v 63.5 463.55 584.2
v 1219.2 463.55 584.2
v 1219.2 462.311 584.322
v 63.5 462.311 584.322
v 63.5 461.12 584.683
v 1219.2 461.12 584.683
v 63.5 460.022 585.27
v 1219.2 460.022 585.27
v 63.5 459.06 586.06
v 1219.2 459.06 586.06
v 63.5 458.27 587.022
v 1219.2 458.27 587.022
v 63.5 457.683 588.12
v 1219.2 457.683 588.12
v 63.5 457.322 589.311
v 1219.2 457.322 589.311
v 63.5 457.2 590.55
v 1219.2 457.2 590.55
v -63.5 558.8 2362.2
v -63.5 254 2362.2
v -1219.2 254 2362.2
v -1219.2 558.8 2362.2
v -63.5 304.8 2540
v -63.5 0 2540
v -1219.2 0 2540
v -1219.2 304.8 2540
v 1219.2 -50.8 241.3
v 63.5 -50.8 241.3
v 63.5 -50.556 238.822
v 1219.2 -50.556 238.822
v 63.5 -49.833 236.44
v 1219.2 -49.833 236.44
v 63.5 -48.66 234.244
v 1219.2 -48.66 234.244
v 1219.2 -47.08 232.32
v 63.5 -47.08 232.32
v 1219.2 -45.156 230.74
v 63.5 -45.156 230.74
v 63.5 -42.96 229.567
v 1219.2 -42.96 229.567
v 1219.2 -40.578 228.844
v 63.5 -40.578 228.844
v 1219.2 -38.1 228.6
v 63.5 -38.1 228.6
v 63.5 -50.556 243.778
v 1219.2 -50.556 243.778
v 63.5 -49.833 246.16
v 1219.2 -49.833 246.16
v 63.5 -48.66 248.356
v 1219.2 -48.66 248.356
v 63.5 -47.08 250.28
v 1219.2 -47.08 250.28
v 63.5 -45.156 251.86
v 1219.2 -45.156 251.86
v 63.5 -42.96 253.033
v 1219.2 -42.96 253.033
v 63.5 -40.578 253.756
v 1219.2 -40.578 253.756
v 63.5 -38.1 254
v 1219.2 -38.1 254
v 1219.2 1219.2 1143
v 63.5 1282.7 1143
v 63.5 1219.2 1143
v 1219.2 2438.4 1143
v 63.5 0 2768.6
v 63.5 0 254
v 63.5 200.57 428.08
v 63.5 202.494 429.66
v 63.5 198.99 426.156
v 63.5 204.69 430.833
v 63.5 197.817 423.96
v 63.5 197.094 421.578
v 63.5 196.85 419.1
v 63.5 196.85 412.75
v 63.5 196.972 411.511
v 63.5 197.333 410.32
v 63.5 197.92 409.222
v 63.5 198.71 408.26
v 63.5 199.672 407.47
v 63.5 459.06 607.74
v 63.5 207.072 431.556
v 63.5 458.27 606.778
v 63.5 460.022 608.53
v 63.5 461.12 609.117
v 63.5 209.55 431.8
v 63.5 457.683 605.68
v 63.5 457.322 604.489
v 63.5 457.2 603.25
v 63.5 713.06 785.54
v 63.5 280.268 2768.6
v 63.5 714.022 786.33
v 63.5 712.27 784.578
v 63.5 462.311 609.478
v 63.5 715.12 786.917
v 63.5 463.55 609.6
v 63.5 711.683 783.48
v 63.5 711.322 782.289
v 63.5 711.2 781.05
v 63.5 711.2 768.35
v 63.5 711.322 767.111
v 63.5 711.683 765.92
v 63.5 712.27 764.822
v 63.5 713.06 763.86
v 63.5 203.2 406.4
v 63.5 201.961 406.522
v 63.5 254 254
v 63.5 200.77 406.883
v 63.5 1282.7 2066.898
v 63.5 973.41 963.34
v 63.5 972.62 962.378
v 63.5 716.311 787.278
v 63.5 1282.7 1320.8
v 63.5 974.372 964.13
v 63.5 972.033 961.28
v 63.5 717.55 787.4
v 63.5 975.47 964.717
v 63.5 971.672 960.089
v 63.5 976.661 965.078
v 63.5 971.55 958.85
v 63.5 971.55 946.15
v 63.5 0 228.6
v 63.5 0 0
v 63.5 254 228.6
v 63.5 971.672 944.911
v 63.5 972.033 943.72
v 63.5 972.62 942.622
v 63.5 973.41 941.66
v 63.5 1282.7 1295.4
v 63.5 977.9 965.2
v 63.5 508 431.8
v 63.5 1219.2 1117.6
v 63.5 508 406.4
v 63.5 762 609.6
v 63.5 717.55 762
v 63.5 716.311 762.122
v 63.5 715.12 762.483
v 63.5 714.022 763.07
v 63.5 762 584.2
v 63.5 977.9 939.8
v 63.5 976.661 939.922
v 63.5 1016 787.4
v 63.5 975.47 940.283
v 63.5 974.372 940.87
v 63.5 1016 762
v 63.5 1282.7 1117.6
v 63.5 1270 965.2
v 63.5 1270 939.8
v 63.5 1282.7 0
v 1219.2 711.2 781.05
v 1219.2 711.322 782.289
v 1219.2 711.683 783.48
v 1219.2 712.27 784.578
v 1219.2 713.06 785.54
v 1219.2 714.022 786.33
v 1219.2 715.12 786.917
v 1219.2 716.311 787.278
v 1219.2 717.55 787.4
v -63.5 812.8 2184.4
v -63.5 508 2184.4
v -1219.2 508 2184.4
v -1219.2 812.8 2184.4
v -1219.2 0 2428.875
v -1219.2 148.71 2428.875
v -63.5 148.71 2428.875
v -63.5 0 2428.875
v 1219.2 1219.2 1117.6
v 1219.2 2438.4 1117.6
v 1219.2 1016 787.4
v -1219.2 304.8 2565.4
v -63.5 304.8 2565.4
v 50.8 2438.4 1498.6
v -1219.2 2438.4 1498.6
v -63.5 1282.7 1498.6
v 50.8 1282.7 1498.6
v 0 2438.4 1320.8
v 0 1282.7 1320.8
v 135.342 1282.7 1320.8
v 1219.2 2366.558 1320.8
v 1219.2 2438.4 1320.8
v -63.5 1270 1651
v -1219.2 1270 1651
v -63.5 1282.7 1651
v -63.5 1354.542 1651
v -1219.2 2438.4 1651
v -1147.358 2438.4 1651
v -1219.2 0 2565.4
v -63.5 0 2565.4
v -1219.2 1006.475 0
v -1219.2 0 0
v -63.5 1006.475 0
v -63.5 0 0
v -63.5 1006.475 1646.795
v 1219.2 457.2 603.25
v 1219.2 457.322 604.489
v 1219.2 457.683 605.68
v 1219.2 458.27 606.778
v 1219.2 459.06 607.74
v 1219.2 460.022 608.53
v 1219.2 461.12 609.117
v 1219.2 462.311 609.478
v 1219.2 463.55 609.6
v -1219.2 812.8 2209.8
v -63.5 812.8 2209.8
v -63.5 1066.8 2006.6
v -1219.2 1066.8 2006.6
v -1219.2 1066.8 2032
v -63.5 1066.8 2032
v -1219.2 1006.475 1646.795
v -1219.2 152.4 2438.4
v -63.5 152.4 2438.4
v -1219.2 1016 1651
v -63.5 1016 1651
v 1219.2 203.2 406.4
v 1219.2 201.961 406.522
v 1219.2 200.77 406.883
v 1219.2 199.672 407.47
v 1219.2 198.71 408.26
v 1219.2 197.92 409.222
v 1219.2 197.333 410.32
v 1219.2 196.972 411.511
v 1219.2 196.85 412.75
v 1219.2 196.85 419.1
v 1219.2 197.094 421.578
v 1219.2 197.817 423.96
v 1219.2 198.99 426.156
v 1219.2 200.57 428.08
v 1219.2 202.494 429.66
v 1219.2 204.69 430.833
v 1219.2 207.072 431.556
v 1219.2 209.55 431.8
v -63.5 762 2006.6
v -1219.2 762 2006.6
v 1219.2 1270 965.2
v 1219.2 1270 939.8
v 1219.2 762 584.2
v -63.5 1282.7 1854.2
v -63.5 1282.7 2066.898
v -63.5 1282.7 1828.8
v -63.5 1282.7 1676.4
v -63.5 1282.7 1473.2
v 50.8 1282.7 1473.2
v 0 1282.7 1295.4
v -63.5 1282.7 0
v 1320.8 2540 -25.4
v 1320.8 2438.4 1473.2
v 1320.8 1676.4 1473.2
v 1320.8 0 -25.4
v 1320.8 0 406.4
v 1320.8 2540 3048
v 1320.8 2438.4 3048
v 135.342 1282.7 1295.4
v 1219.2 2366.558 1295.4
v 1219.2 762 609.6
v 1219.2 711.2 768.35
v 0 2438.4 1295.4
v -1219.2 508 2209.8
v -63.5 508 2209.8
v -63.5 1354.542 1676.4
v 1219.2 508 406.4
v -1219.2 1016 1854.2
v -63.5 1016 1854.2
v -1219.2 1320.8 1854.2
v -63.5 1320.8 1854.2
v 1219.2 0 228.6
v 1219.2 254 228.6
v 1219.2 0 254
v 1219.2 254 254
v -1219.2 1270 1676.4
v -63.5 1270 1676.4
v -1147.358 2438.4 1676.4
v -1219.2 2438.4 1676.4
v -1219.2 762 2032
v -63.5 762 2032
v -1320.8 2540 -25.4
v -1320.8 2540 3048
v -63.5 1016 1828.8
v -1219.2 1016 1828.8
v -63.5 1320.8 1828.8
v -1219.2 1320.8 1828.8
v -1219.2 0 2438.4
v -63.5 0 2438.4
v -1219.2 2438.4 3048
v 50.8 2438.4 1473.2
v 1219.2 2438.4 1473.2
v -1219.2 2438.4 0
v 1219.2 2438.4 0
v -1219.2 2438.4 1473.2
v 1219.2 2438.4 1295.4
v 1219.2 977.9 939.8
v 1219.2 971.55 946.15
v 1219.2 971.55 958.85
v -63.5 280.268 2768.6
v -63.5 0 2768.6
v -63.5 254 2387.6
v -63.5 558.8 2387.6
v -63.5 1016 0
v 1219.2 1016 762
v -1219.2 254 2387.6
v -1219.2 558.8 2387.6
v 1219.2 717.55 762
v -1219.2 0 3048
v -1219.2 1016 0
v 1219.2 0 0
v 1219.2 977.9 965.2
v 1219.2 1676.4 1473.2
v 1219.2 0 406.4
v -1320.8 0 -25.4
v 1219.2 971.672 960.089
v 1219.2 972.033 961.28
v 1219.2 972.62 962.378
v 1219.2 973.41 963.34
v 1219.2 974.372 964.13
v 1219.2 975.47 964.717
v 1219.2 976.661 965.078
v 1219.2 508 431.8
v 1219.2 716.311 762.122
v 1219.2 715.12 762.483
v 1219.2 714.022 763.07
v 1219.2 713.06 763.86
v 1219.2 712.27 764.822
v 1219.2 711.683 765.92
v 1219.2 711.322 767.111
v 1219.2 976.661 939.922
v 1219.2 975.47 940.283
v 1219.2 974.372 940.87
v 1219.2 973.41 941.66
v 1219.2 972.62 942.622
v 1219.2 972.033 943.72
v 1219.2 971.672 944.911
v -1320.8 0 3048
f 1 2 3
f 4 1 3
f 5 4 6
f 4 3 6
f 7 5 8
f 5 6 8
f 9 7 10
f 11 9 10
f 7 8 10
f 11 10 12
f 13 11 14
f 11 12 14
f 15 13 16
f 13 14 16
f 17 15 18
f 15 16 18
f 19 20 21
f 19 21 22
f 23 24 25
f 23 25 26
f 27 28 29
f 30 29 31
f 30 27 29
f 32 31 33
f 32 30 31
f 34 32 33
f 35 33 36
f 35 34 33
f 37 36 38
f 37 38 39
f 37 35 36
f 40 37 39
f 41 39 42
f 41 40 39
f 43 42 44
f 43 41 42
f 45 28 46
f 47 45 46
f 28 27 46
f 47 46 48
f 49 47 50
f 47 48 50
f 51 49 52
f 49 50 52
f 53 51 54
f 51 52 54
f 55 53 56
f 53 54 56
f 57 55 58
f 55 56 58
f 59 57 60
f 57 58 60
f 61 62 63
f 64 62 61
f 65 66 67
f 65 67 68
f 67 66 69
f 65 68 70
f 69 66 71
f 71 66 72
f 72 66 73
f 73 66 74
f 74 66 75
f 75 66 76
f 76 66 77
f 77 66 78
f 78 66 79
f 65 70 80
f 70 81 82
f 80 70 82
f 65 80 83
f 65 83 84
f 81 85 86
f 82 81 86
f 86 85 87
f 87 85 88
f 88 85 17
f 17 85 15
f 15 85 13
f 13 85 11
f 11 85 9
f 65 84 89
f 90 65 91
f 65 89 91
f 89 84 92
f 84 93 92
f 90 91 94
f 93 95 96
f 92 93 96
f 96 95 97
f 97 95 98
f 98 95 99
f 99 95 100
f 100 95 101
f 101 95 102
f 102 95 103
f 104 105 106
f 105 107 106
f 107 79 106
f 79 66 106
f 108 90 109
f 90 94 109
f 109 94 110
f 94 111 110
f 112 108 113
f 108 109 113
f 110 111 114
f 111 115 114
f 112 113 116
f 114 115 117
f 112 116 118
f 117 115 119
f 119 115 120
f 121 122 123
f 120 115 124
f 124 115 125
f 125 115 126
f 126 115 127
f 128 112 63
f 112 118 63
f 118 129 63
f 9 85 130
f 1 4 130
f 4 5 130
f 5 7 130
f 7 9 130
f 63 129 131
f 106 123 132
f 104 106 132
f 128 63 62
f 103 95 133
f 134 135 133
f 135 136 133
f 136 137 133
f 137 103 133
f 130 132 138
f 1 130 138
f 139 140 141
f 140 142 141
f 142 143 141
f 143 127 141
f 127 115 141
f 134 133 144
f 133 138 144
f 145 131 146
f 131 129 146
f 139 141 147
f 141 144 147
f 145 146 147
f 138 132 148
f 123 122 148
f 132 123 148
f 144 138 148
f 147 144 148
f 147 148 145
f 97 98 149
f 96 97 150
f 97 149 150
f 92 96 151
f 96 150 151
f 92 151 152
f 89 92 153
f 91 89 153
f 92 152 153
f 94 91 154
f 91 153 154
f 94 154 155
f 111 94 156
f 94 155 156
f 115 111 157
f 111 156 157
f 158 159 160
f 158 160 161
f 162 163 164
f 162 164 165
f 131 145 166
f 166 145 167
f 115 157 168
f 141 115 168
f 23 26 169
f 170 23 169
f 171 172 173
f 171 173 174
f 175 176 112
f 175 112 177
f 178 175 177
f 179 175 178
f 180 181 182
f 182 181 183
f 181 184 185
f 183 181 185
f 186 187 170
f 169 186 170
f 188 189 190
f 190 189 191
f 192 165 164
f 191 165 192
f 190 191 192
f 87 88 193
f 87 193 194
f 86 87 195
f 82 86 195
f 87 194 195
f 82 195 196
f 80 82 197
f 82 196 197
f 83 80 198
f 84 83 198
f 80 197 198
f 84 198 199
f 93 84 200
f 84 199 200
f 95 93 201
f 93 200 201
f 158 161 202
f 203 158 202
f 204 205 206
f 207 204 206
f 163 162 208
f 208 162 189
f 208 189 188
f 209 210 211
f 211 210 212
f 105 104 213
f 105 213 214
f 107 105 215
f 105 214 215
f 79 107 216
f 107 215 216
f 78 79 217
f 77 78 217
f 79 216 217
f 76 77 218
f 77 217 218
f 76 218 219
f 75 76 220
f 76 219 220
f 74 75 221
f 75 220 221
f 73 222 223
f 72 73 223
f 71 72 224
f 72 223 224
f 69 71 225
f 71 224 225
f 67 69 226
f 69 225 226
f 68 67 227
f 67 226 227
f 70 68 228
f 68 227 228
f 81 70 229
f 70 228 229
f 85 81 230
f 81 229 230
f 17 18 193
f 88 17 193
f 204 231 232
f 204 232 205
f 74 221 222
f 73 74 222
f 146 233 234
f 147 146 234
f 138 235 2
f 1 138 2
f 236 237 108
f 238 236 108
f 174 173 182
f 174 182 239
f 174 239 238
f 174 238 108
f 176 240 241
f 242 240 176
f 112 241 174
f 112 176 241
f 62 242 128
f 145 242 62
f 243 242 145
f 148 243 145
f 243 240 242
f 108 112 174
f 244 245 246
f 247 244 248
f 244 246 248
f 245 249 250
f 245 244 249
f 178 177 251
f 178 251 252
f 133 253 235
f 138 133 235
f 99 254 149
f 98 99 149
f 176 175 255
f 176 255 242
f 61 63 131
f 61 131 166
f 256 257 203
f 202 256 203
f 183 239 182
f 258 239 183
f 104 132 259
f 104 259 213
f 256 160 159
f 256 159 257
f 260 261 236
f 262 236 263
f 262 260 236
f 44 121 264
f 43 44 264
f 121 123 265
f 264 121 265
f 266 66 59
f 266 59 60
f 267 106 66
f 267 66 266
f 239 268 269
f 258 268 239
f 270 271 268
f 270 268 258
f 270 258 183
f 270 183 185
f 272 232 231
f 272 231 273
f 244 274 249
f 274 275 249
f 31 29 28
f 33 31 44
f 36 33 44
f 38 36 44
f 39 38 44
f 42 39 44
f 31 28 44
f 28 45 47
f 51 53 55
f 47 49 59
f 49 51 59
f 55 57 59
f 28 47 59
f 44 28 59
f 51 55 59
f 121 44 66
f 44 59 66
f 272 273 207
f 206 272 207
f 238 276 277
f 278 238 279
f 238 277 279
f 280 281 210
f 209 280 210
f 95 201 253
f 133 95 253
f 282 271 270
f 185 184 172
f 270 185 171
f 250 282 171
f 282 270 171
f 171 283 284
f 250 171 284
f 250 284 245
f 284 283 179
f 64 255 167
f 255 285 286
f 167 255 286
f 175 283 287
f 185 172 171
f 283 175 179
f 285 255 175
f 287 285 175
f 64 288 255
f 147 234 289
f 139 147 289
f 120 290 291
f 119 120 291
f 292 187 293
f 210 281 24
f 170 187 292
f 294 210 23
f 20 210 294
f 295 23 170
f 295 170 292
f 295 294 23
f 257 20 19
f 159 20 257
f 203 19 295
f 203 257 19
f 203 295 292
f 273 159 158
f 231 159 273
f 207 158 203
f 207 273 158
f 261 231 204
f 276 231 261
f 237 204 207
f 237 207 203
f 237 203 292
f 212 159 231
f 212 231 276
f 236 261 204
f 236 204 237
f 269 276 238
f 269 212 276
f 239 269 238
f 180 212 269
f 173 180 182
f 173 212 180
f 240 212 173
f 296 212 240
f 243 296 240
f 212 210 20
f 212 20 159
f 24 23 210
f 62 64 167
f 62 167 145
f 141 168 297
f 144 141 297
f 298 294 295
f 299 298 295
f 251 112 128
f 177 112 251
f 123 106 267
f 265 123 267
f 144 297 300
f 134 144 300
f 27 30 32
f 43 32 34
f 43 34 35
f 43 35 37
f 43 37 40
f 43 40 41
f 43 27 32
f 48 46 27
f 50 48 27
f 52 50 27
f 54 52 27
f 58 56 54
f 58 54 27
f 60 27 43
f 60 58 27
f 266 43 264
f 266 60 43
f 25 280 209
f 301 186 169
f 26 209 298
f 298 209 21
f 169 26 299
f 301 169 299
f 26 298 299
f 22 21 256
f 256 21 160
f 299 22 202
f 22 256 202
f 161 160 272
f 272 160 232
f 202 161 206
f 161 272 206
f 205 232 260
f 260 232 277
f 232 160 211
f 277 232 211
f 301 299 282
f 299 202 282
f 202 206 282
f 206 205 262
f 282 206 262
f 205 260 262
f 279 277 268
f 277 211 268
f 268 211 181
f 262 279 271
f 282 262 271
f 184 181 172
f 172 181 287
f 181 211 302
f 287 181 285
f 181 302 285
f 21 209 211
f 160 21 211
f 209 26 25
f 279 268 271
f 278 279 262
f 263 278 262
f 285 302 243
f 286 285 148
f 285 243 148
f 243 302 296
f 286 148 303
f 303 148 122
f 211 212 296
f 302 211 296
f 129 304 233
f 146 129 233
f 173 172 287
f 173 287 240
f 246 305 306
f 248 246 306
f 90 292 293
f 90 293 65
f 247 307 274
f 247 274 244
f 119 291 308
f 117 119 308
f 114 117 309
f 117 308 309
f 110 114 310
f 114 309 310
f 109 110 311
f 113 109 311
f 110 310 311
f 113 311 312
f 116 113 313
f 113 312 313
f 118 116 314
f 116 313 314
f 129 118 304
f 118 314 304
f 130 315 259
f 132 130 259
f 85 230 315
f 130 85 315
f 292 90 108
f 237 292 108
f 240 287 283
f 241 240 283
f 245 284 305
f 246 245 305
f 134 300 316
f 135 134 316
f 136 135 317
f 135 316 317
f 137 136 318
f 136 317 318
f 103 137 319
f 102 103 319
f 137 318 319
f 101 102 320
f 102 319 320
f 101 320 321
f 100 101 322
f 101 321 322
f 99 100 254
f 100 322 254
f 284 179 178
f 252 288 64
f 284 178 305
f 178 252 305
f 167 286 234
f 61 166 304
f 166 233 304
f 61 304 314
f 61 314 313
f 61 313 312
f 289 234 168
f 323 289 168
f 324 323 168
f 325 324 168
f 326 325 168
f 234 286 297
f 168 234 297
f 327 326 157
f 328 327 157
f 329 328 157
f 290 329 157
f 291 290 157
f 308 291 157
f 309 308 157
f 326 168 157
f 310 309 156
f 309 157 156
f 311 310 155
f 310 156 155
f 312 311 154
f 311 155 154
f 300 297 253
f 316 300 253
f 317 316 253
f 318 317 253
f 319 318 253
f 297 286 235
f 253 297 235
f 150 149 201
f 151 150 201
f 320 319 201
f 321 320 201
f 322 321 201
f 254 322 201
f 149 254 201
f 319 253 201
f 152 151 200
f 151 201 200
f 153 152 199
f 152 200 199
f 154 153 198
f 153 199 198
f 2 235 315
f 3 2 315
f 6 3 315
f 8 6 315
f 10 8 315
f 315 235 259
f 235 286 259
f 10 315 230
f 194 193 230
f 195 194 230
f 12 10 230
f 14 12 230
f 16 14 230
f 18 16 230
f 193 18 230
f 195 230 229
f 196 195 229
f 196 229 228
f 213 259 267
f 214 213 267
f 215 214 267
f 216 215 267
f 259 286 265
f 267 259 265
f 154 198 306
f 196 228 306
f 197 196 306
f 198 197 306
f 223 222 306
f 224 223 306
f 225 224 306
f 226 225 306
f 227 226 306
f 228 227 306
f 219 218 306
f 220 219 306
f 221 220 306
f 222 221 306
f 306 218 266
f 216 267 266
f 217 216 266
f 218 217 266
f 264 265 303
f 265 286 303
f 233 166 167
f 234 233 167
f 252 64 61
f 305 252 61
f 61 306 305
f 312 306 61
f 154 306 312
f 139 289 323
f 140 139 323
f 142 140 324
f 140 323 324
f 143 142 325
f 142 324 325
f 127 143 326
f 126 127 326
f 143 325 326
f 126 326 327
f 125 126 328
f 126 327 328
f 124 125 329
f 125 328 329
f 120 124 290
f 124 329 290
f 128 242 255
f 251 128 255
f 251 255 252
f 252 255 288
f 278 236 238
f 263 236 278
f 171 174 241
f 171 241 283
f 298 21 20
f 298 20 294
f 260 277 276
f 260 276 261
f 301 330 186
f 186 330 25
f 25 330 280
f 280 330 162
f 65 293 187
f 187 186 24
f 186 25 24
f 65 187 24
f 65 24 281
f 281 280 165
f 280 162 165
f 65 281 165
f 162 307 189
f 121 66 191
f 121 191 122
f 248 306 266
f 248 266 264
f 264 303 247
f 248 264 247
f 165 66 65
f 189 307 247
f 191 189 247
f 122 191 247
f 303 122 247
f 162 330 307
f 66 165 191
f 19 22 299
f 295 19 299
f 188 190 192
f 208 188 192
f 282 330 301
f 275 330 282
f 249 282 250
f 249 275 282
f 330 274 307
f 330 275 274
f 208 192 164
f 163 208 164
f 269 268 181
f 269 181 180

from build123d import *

# Parameters (mm, degrees)
F2_DEPTH  = 3048
F4_W      = 1155.7
F4_H      = 304.8
F5_DEPTH  = 25.4
F6_R      = 12.69999
F8_DEPTH  = 1155.7
F11_DEPTH = 25.4
F14_DEPTH = 25.4
F17_DEPTH = 25.4
F20_DEPTH = 25.4
F21_W     = 304.8
F21_H     = 25.4
F22_DEPTH = 1155.7
F24_W     = 2641.6
F24_H     = 2540
F25_DEPTH = 25.4
F23_W     = 127
F23_H     = 1282.7
F26_DEPTH = 2768.6
F28_DEPTH = 101.601
F30_DEPTH = 152.4
F32_DEPTH = 1155.7


# Not quite as in the source:
# - a fillet or chamfer is up to 0.001 mm smaller than in the source, because OpenCascade refuses the exact size


with BuildPart() as f2:
    # F1 (on Top) → F2 (new body)
    with BuildSketch(Plane.XY):
        Polygon((-1320.8, 0), (-1219.2, 0), (-1219.2, 2438.4), (1219.2, 2438.4), (1219.2, 0), (1320.8, 0), (1320.8, 2540), (-1320.8, 2540), align=None)
    extrude(amount=F2_DEPTH)

    # F4 (on offset) → F5 (join)
    with BuildSketch(Plane.XY.offset(254)):
        with Locations((641.35, 101.6)):
            Rectangle(F4_W, F4_H)
    extrude(amount=-F5_DEPTH)

    # F6 (radius 12.7 in the source; OpenCascade refuses exactly that, so slightly less here)
    f6_edges = [f2.edges().sort_by_distance(p)[0] for p in [
        (641.35, -50.8, 254),
        (641.35, -50.8, 228.6),
    ]]
    fillet(f6_edges, radius=F6_R)

    # F7 (on face) → F8 (join, through all)
    with BuildSketch(Plane(origin=(1219.2, 0, 0), x_dir=(0, -1, 0), z_dir=(-1, 0, 0))):
        with BuildLine():
            Line((-717.55, 787.4), (-1016, 787.4))
            Line((-1016, 787.4), (-1016, 762))
            Line((-1016, 762), (-717.55, 762))
            ThreePointArc((-717.55, 762), (-713.0598719395, 763.8598719395), (-711.2, 768.35))
            Line((-711.2, 768.35), (-711.2, 781.05))
            ThreePointArc((-711.2, 781.05), (-713.0598719395, 785.5401280605), (-717.55, 787.4))
        make_face()
        with BuildLine():
            Line((-463.55, 609.6), (-762, 609.6))
            Line((-762, 609.6), (-762, 584.2))
            Line((-762, 584.2), (-463.55, 584.2))
            ThreePointArc((-463.55, 584.2), (-459.0598719395, 586.0598719395), (-457.2, 590.55))
            Line((-457.2, 590.55), (-457.2, 603.25))
            ThreePointArc((-457.2, 603.25), (-459.0598719395, 607.7401280605), (-463.55, 609.6))
        make_face()
        with BuildLine():
            Line((-209.55, 431.8), (-508, 431.8))
            Line((-508, 431.8), (-508, 406.4))
            Line((-508, 406.4), (-203.2, 406.4))
            ThreePointArc((-203.2, 406.4), (-198.7098719395, 408.2598719395), (-196.85, 412.75))
            Line((-196.85, 412.75), (-196.85, 419.1))
            ThreePointArc((-196.85, 419.1), (-200.5697438789, 428.0802561211), (-209.55, 431.8))
        make_face()
        with BuildLine():
            Line((-1270, 939.8), (-977.9, 939.8))
            ThreePointArc((-977.9, 939.8), (-973.4098719395, 941.6598719395), (-971.55, 946.15))
            Line((-971.55, 946.15), (-971.55, 958.85))
            ThreePointArc((-971.55, 958.85), (-973.4098719395, 963.3401280605), (-977.9, 965.2))
            Line((-977.9, 965.2), (-1270, 965.2))
            Line((-1270, 965.2), (-1270, 939.8))
        make_face()
    extrude(amount=F8_DEPTH)

    # F10 (on offset) → F11 (join)
    with BuildSketch(Plane.XY.offset(1143)):
        Polygon((1219.2, 2438.4), (63.5, 1282.7), (63.5, 1219.2), (1219.2, 1219.2), align=None)
    extrude(amount=-F11_DEPTH)

    # F13 (on offset) → F14 (join)
    with BuildSketch(Plane.XY.offset(1320.8)):
        Polygon((0, 2438.4), (0, 1282.7), (135.3420489686, 1282.7), (1219.2, 2366.5579510314), (1219.2, 2438.4), align=None)
    extrude(amount=-F14_DEPTH)

    # F16 (on offset) → F17 (join)
    with BuildSketch(Plane.XY.offset(1498.6)):
        Polygon((-1219.2, 2438.4), (-63.5, 1282.7), (50.8, 1282.7), (50.8, 2438.4), align=None)
    extrude(amount=-F17_DEPTH)

    # F19 (on offset) → F20 (join)
    with BuildSketch(Plane.XY.offset(1676.4)):
        Polygon((-1219.2, 2438.4), (-1219.2, 1270), (-63.5, 1270), (-63.5, 1354.5420489686), (-1147.3579510314, 2438.4), align=None)
    extrude(amount=-F20_DEPTH)

    # F21 (on face) → F22 (join)
    with BuildSketch(Plane.YZ.offset(-1219.2)):
        with Locations((1168.4, 1841.5)):
            Rectangle(F21_W, F21_H)
        with Locations((914.4, 2019.3)):
            Rectangle(F21_W, F21_H)
        with Locations((660.4, 2197.1)):
            Rectangle(F21_W, F21_H)
        with Locations((406.4, 2374.9)):
            Rectangle(F21_W, F21_H)
        with Locations((152.4, 2552.7)):
            Rectangle(F21_W, F21_H)
    extrude(amount=F22_DEPTH)

    # F24 (on face) → F25 (join)
    with BuildSketch(Plane(origin=(0, 0, 0), x_dir=(1, 0, 0), z_dir=(0, 0, -1))):
        with Locations((0, -1270)):
            Rectangle(F24_W, F24_H)
    extrude(amount=F25_DEPTH)

    # F23 (on Top) → F26 (join)
    with BuildSketch(Plane.XY):
        with Locations((0, 641.35)):
            Rectangle(F23_W, F23_H)
    extrude(amount=F26_DEPTH)

    # F27 (on face) → F28 (cut, through all)
    with BuildSketch(Plane(origin=(1219.2, 0, 0), x_dir=(0, -1, 0), z_dir=(-1, 0, 0))):
        Polygon((-1676.4, 1473.2), (0, 406.4), (0, 3048), (-2438.4, 3048), (-2438.4, 1473.2), align=None)
    extrude(amount=-F28_DEPTH, mode=Mode.SUBTRACT)

    # F29 (on face) → F30 (cut)
    with BuildSketch(Plane.YZ.offset(63.5)):
        Polygon((1282.7, 2768.6), (280.2684394054, 2768.6), (1282.7, 2066.8979075838), align=None)
    extrude(amount=-F30_DEPTH, mode=Mode.SUBTRACT)

    # F31 (on face) → F32 (join, through all)
    with BuildSketch(Plane(origin=(-63.5, 0, 0), x_dir=(0, -1, 0), z_dir=(-1, 0, 0))):
        Polygon((-152.4, 2438.4), (-1016, 1651), (-1016, 0), (-1006.475, 0), (-1006.475, 1646.7947494006), (-148.7095638587, 2428.875), (0, 2428.875), (0, 2438.4), align=None)
    extrude(amount=F32_DEPTH)


solid = f2.part
